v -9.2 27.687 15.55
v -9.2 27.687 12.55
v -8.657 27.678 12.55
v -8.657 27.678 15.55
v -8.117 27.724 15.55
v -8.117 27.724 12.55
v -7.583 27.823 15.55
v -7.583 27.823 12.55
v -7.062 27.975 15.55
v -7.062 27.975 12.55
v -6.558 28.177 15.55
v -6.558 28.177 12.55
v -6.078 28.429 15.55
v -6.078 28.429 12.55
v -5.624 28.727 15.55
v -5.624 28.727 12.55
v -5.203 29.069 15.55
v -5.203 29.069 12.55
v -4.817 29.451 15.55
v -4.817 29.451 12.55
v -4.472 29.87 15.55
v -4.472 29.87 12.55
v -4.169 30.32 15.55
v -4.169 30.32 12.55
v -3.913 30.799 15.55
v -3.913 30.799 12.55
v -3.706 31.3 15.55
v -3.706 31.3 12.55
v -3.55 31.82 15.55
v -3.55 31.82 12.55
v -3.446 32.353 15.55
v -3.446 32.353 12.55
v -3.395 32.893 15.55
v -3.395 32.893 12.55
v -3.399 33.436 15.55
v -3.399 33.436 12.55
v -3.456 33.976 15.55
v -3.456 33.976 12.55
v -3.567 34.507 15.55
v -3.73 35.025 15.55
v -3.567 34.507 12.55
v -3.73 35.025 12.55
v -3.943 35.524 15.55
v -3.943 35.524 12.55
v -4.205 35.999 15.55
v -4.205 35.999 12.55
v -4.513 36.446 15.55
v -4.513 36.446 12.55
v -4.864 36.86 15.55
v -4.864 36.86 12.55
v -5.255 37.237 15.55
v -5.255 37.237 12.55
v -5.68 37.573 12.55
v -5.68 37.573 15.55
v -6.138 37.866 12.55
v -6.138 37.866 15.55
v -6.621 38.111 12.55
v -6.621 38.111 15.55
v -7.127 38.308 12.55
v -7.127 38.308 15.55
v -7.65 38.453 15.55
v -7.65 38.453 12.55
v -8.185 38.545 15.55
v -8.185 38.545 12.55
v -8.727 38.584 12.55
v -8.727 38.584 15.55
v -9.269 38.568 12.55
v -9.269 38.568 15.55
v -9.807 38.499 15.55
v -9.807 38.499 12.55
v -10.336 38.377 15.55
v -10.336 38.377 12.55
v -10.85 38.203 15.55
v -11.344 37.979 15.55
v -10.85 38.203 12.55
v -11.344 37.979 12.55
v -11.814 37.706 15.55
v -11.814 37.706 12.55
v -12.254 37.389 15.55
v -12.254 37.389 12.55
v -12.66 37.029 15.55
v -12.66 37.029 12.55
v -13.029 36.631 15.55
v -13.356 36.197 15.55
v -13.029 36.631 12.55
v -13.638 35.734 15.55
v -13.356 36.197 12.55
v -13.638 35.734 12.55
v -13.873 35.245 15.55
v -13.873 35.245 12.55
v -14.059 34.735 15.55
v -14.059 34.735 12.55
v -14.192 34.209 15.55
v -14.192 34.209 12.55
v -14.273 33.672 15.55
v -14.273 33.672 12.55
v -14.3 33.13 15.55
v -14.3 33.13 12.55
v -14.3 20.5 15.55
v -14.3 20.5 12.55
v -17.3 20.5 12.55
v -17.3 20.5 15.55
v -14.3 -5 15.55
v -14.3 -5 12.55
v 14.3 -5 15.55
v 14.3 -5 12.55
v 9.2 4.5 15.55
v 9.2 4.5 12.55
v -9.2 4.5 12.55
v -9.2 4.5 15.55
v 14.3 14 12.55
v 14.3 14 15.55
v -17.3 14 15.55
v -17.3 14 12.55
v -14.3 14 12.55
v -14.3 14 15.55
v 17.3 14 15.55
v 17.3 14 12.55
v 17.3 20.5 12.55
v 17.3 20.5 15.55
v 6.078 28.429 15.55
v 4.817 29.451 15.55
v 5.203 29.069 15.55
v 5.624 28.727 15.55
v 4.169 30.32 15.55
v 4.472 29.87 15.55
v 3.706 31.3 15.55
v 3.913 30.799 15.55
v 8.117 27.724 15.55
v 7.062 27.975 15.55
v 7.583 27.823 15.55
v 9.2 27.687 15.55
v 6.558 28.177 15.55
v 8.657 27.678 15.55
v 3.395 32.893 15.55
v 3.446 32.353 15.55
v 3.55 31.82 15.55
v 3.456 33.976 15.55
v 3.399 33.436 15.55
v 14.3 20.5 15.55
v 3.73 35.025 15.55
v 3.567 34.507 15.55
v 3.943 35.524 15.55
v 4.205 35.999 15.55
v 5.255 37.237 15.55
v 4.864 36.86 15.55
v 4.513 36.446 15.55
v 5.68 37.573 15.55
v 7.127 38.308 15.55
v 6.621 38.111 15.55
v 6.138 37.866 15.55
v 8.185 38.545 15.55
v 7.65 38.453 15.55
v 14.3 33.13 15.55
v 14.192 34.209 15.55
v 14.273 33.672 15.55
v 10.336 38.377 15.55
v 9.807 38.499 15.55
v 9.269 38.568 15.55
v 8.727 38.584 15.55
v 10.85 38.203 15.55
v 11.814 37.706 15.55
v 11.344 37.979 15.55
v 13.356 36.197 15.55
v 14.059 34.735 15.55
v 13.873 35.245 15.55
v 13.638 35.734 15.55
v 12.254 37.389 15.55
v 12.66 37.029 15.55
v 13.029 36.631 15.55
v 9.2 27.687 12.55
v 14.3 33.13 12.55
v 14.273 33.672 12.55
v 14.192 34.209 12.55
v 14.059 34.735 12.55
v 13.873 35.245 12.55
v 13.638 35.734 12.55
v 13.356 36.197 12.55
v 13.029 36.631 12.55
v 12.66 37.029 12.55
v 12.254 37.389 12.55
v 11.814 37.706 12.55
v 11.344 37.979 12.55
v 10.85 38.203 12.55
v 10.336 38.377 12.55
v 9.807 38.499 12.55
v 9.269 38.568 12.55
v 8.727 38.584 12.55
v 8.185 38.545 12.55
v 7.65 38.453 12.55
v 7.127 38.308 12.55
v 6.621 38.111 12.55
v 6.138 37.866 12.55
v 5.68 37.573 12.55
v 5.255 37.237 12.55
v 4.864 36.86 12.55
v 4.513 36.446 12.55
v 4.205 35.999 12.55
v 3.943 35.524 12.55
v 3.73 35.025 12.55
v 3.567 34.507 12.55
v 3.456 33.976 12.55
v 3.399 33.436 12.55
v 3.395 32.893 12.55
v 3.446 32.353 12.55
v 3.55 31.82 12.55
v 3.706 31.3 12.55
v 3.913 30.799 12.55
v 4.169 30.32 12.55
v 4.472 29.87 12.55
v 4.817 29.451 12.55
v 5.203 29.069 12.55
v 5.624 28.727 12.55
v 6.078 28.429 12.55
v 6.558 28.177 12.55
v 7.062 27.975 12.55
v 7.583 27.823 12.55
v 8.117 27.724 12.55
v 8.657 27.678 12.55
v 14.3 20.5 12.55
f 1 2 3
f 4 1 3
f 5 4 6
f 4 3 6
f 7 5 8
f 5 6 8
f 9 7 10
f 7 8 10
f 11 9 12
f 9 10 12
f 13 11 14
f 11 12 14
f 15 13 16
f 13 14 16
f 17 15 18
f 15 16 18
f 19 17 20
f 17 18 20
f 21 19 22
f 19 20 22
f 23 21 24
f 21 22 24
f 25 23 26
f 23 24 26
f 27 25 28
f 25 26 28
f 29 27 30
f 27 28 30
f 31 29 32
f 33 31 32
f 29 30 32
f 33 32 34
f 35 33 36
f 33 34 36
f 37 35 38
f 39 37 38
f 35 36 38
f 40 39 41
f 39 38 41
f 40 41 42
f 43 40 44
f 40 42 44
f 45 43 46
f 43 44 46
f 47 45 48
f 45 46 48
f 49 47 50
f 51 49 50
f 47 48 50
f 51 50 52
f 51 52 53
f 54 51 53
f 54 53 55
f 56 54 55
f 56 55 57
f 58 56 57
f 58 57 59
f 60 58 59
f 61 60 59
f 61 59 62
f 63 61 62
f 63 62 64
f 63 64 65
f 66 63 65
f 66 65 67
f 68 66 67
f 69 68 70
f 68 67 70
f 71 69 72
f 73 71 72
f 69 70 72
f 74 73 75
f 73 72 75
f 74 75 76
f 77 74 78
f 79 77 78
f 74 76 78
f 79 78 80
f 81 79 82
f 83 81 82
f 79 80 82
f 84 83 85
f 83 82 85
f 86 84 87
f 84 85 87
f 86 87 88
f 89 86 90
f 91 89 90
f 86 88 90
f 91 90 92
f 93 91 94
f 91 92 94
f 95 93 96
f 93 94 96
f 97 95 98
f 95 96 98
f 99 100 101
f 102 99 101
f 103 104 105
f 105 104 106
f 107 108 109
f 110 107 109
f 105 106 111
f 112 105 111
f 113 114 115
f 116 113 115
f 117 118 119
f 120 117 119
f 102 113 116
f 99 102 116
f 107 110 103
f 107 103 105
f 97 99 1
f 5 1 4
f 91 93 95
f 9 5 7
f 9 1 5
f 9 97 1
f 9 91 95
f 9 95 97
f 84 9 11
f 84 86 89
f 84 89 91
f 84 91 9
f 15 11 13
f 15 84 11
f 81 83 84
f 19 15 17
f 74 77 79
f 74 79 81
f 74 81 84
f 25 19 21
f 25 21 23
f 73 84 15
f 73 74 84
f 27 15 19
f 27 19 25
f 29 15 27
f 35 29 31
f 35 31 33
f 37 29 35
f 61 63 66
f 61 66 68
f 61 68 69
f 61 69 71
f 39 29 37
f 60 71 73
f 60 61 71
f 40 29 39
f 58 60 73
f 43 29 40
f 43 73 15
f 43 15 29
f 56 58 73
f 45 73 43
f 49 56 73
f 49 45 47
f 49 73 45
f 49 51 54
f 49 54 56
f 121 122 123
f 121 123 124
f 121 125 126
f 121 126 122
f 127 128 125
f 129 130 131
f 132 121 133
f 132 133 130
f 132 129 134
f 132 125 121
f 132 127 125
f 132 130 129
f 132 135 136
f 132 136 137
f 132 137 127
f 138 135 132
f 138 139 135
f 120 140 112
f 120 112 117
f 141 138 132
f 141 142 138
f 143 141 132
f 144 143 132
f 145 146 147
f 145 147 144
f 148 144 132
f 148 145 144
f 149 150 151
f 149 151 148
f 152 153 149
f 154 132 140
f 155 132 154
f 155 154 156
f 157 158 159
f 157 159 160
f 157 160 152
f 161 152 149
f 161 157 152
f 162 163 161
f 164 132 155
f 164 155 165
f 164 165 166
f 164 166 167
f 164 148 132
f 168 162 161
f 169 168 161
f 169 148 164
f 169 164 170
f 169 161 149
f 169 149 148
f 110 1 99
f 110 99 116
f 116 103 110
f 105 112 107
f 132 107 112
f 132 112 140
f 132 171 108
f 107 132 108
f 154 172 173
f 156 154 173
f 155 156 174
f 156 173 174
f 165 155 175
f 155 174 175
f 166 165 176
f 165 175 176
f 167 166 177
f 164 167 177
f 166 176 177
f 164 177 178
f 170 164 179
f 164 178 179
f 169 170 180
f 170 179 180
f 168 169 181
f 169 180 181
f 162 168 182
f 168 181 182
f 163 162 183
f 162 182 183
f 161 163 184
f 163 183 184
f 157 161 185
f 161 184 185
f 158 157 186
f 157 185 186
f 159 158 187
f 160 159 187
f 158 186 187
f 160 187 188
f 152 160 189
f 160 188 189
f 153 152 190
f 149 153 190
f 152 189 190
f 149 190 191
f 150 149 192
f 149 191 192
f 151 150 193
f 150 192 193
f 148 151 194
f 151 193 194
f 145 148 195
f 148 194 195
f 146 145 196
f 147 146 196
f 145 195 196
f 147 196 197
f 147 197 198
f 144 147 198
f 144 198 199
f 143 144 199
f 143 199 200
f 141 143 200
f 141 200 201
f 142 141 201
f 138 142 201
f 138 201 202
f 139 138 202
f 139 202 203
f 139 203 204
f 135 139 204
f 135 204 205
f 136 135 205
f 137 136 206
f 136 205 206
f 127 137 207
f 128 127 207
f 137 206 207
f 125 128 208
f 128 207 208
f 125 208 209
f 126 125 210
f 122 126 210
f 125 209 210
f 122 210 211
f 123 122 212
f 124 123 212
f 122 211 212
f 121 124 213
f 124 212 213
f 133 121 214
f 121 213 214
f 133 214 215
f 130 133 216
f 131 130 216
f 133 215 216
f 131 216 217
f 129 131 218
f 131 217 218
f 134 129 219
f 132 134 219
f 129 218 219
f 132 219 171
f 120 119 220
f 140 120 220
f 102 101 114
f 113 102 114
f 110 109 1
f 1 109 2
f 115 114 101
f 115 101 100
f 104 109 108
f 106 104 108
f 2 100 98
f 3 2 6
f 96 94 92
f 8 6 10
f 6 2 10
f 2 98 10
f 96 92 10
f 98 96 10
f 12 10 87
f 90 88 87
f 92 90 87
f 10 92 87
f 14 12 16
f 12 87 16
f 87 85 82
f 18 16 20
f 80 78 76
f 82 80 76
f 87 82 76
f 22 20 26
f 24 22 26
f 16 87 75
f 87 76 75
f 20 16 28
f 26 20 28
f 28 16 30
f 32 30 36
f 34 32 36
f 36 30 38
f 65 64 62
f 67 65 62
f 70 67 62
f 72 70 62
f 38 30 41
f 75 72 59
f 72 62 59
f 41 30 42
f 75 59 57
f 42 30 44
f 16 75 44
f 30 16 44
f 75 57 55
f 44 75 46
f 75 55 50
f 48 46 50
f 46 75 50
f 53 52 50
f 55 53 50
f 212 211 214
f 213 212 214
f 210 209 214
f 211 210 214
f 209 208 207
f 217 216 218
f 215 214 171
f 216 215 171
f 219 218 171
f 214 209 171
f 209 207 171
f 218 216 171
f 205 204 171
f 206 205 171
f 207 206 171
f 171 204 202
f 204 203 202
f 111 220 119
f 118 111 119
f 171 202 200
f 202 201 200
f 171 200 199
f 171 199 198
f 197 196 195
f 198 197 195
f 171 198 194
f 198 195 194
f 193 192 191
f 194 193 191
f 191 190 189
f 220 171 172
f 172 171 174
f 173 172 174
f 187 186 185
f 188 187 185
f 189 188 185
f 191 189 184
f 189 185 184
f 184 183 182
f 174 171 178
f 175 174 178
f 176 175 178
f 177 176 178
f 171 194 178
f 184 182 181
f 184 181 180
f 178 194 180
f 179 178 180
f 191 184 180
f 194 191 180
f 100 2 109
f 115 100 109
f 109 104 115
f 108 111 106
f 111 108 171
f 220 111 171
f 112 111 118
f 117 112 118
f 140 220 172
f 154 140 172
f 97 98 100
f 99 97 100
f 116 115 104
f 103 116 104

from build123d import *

# Parameters (mm, degrees)
BASE_START = 3
BASE_DEPTH = 3


with BuildPart() as part:
    # Sketch5 → Base (new body)
    with BuildSketch(Plane.XY.offset(9.55).offset(BASE_START)):
        with BuildLine():
            Line((9.2, 4.5), (-9.2, 4.5))
            Line((-9.2, 4.5), (-9.2, 27.686563585))
            ThreePointArc((-9.2, 27.686563585), (-4.864199201, 36.859644755), (-14.3, 33.13))
            Line((-14.3, 33.13), (-14.3, 20.5))
            Line((-14.3, 20.5), (-17.3, 20.5))
            Line((-17.3, 20.5), (-17.3, 14))
            Line((-17.3, 14), (-14.3, 14))
            Line((-14.3, 14), (-14.3, -5))
            Line((-14.3, -5), (14.3, -5))
            Line((14.3, -5), (14.3, 14))
            Line((14.3, 14), (17.3, 14))
            Line((17.3, 14), (17.3, 20.5))
            Line((17.3, 20.5), (14.3, 20.5))
            Line((14.3, 20.5), (14.3, 33.13))
            ThreePointArc((14.3, 33.13), (4.864199201, 36.859644755), (9.2, 27.686563585))
            Line((9.2, 27.686563585), (9.2, 4.5))
        make_face()
    extrude(amount=BASE_DEPTH)


solid = part.part
